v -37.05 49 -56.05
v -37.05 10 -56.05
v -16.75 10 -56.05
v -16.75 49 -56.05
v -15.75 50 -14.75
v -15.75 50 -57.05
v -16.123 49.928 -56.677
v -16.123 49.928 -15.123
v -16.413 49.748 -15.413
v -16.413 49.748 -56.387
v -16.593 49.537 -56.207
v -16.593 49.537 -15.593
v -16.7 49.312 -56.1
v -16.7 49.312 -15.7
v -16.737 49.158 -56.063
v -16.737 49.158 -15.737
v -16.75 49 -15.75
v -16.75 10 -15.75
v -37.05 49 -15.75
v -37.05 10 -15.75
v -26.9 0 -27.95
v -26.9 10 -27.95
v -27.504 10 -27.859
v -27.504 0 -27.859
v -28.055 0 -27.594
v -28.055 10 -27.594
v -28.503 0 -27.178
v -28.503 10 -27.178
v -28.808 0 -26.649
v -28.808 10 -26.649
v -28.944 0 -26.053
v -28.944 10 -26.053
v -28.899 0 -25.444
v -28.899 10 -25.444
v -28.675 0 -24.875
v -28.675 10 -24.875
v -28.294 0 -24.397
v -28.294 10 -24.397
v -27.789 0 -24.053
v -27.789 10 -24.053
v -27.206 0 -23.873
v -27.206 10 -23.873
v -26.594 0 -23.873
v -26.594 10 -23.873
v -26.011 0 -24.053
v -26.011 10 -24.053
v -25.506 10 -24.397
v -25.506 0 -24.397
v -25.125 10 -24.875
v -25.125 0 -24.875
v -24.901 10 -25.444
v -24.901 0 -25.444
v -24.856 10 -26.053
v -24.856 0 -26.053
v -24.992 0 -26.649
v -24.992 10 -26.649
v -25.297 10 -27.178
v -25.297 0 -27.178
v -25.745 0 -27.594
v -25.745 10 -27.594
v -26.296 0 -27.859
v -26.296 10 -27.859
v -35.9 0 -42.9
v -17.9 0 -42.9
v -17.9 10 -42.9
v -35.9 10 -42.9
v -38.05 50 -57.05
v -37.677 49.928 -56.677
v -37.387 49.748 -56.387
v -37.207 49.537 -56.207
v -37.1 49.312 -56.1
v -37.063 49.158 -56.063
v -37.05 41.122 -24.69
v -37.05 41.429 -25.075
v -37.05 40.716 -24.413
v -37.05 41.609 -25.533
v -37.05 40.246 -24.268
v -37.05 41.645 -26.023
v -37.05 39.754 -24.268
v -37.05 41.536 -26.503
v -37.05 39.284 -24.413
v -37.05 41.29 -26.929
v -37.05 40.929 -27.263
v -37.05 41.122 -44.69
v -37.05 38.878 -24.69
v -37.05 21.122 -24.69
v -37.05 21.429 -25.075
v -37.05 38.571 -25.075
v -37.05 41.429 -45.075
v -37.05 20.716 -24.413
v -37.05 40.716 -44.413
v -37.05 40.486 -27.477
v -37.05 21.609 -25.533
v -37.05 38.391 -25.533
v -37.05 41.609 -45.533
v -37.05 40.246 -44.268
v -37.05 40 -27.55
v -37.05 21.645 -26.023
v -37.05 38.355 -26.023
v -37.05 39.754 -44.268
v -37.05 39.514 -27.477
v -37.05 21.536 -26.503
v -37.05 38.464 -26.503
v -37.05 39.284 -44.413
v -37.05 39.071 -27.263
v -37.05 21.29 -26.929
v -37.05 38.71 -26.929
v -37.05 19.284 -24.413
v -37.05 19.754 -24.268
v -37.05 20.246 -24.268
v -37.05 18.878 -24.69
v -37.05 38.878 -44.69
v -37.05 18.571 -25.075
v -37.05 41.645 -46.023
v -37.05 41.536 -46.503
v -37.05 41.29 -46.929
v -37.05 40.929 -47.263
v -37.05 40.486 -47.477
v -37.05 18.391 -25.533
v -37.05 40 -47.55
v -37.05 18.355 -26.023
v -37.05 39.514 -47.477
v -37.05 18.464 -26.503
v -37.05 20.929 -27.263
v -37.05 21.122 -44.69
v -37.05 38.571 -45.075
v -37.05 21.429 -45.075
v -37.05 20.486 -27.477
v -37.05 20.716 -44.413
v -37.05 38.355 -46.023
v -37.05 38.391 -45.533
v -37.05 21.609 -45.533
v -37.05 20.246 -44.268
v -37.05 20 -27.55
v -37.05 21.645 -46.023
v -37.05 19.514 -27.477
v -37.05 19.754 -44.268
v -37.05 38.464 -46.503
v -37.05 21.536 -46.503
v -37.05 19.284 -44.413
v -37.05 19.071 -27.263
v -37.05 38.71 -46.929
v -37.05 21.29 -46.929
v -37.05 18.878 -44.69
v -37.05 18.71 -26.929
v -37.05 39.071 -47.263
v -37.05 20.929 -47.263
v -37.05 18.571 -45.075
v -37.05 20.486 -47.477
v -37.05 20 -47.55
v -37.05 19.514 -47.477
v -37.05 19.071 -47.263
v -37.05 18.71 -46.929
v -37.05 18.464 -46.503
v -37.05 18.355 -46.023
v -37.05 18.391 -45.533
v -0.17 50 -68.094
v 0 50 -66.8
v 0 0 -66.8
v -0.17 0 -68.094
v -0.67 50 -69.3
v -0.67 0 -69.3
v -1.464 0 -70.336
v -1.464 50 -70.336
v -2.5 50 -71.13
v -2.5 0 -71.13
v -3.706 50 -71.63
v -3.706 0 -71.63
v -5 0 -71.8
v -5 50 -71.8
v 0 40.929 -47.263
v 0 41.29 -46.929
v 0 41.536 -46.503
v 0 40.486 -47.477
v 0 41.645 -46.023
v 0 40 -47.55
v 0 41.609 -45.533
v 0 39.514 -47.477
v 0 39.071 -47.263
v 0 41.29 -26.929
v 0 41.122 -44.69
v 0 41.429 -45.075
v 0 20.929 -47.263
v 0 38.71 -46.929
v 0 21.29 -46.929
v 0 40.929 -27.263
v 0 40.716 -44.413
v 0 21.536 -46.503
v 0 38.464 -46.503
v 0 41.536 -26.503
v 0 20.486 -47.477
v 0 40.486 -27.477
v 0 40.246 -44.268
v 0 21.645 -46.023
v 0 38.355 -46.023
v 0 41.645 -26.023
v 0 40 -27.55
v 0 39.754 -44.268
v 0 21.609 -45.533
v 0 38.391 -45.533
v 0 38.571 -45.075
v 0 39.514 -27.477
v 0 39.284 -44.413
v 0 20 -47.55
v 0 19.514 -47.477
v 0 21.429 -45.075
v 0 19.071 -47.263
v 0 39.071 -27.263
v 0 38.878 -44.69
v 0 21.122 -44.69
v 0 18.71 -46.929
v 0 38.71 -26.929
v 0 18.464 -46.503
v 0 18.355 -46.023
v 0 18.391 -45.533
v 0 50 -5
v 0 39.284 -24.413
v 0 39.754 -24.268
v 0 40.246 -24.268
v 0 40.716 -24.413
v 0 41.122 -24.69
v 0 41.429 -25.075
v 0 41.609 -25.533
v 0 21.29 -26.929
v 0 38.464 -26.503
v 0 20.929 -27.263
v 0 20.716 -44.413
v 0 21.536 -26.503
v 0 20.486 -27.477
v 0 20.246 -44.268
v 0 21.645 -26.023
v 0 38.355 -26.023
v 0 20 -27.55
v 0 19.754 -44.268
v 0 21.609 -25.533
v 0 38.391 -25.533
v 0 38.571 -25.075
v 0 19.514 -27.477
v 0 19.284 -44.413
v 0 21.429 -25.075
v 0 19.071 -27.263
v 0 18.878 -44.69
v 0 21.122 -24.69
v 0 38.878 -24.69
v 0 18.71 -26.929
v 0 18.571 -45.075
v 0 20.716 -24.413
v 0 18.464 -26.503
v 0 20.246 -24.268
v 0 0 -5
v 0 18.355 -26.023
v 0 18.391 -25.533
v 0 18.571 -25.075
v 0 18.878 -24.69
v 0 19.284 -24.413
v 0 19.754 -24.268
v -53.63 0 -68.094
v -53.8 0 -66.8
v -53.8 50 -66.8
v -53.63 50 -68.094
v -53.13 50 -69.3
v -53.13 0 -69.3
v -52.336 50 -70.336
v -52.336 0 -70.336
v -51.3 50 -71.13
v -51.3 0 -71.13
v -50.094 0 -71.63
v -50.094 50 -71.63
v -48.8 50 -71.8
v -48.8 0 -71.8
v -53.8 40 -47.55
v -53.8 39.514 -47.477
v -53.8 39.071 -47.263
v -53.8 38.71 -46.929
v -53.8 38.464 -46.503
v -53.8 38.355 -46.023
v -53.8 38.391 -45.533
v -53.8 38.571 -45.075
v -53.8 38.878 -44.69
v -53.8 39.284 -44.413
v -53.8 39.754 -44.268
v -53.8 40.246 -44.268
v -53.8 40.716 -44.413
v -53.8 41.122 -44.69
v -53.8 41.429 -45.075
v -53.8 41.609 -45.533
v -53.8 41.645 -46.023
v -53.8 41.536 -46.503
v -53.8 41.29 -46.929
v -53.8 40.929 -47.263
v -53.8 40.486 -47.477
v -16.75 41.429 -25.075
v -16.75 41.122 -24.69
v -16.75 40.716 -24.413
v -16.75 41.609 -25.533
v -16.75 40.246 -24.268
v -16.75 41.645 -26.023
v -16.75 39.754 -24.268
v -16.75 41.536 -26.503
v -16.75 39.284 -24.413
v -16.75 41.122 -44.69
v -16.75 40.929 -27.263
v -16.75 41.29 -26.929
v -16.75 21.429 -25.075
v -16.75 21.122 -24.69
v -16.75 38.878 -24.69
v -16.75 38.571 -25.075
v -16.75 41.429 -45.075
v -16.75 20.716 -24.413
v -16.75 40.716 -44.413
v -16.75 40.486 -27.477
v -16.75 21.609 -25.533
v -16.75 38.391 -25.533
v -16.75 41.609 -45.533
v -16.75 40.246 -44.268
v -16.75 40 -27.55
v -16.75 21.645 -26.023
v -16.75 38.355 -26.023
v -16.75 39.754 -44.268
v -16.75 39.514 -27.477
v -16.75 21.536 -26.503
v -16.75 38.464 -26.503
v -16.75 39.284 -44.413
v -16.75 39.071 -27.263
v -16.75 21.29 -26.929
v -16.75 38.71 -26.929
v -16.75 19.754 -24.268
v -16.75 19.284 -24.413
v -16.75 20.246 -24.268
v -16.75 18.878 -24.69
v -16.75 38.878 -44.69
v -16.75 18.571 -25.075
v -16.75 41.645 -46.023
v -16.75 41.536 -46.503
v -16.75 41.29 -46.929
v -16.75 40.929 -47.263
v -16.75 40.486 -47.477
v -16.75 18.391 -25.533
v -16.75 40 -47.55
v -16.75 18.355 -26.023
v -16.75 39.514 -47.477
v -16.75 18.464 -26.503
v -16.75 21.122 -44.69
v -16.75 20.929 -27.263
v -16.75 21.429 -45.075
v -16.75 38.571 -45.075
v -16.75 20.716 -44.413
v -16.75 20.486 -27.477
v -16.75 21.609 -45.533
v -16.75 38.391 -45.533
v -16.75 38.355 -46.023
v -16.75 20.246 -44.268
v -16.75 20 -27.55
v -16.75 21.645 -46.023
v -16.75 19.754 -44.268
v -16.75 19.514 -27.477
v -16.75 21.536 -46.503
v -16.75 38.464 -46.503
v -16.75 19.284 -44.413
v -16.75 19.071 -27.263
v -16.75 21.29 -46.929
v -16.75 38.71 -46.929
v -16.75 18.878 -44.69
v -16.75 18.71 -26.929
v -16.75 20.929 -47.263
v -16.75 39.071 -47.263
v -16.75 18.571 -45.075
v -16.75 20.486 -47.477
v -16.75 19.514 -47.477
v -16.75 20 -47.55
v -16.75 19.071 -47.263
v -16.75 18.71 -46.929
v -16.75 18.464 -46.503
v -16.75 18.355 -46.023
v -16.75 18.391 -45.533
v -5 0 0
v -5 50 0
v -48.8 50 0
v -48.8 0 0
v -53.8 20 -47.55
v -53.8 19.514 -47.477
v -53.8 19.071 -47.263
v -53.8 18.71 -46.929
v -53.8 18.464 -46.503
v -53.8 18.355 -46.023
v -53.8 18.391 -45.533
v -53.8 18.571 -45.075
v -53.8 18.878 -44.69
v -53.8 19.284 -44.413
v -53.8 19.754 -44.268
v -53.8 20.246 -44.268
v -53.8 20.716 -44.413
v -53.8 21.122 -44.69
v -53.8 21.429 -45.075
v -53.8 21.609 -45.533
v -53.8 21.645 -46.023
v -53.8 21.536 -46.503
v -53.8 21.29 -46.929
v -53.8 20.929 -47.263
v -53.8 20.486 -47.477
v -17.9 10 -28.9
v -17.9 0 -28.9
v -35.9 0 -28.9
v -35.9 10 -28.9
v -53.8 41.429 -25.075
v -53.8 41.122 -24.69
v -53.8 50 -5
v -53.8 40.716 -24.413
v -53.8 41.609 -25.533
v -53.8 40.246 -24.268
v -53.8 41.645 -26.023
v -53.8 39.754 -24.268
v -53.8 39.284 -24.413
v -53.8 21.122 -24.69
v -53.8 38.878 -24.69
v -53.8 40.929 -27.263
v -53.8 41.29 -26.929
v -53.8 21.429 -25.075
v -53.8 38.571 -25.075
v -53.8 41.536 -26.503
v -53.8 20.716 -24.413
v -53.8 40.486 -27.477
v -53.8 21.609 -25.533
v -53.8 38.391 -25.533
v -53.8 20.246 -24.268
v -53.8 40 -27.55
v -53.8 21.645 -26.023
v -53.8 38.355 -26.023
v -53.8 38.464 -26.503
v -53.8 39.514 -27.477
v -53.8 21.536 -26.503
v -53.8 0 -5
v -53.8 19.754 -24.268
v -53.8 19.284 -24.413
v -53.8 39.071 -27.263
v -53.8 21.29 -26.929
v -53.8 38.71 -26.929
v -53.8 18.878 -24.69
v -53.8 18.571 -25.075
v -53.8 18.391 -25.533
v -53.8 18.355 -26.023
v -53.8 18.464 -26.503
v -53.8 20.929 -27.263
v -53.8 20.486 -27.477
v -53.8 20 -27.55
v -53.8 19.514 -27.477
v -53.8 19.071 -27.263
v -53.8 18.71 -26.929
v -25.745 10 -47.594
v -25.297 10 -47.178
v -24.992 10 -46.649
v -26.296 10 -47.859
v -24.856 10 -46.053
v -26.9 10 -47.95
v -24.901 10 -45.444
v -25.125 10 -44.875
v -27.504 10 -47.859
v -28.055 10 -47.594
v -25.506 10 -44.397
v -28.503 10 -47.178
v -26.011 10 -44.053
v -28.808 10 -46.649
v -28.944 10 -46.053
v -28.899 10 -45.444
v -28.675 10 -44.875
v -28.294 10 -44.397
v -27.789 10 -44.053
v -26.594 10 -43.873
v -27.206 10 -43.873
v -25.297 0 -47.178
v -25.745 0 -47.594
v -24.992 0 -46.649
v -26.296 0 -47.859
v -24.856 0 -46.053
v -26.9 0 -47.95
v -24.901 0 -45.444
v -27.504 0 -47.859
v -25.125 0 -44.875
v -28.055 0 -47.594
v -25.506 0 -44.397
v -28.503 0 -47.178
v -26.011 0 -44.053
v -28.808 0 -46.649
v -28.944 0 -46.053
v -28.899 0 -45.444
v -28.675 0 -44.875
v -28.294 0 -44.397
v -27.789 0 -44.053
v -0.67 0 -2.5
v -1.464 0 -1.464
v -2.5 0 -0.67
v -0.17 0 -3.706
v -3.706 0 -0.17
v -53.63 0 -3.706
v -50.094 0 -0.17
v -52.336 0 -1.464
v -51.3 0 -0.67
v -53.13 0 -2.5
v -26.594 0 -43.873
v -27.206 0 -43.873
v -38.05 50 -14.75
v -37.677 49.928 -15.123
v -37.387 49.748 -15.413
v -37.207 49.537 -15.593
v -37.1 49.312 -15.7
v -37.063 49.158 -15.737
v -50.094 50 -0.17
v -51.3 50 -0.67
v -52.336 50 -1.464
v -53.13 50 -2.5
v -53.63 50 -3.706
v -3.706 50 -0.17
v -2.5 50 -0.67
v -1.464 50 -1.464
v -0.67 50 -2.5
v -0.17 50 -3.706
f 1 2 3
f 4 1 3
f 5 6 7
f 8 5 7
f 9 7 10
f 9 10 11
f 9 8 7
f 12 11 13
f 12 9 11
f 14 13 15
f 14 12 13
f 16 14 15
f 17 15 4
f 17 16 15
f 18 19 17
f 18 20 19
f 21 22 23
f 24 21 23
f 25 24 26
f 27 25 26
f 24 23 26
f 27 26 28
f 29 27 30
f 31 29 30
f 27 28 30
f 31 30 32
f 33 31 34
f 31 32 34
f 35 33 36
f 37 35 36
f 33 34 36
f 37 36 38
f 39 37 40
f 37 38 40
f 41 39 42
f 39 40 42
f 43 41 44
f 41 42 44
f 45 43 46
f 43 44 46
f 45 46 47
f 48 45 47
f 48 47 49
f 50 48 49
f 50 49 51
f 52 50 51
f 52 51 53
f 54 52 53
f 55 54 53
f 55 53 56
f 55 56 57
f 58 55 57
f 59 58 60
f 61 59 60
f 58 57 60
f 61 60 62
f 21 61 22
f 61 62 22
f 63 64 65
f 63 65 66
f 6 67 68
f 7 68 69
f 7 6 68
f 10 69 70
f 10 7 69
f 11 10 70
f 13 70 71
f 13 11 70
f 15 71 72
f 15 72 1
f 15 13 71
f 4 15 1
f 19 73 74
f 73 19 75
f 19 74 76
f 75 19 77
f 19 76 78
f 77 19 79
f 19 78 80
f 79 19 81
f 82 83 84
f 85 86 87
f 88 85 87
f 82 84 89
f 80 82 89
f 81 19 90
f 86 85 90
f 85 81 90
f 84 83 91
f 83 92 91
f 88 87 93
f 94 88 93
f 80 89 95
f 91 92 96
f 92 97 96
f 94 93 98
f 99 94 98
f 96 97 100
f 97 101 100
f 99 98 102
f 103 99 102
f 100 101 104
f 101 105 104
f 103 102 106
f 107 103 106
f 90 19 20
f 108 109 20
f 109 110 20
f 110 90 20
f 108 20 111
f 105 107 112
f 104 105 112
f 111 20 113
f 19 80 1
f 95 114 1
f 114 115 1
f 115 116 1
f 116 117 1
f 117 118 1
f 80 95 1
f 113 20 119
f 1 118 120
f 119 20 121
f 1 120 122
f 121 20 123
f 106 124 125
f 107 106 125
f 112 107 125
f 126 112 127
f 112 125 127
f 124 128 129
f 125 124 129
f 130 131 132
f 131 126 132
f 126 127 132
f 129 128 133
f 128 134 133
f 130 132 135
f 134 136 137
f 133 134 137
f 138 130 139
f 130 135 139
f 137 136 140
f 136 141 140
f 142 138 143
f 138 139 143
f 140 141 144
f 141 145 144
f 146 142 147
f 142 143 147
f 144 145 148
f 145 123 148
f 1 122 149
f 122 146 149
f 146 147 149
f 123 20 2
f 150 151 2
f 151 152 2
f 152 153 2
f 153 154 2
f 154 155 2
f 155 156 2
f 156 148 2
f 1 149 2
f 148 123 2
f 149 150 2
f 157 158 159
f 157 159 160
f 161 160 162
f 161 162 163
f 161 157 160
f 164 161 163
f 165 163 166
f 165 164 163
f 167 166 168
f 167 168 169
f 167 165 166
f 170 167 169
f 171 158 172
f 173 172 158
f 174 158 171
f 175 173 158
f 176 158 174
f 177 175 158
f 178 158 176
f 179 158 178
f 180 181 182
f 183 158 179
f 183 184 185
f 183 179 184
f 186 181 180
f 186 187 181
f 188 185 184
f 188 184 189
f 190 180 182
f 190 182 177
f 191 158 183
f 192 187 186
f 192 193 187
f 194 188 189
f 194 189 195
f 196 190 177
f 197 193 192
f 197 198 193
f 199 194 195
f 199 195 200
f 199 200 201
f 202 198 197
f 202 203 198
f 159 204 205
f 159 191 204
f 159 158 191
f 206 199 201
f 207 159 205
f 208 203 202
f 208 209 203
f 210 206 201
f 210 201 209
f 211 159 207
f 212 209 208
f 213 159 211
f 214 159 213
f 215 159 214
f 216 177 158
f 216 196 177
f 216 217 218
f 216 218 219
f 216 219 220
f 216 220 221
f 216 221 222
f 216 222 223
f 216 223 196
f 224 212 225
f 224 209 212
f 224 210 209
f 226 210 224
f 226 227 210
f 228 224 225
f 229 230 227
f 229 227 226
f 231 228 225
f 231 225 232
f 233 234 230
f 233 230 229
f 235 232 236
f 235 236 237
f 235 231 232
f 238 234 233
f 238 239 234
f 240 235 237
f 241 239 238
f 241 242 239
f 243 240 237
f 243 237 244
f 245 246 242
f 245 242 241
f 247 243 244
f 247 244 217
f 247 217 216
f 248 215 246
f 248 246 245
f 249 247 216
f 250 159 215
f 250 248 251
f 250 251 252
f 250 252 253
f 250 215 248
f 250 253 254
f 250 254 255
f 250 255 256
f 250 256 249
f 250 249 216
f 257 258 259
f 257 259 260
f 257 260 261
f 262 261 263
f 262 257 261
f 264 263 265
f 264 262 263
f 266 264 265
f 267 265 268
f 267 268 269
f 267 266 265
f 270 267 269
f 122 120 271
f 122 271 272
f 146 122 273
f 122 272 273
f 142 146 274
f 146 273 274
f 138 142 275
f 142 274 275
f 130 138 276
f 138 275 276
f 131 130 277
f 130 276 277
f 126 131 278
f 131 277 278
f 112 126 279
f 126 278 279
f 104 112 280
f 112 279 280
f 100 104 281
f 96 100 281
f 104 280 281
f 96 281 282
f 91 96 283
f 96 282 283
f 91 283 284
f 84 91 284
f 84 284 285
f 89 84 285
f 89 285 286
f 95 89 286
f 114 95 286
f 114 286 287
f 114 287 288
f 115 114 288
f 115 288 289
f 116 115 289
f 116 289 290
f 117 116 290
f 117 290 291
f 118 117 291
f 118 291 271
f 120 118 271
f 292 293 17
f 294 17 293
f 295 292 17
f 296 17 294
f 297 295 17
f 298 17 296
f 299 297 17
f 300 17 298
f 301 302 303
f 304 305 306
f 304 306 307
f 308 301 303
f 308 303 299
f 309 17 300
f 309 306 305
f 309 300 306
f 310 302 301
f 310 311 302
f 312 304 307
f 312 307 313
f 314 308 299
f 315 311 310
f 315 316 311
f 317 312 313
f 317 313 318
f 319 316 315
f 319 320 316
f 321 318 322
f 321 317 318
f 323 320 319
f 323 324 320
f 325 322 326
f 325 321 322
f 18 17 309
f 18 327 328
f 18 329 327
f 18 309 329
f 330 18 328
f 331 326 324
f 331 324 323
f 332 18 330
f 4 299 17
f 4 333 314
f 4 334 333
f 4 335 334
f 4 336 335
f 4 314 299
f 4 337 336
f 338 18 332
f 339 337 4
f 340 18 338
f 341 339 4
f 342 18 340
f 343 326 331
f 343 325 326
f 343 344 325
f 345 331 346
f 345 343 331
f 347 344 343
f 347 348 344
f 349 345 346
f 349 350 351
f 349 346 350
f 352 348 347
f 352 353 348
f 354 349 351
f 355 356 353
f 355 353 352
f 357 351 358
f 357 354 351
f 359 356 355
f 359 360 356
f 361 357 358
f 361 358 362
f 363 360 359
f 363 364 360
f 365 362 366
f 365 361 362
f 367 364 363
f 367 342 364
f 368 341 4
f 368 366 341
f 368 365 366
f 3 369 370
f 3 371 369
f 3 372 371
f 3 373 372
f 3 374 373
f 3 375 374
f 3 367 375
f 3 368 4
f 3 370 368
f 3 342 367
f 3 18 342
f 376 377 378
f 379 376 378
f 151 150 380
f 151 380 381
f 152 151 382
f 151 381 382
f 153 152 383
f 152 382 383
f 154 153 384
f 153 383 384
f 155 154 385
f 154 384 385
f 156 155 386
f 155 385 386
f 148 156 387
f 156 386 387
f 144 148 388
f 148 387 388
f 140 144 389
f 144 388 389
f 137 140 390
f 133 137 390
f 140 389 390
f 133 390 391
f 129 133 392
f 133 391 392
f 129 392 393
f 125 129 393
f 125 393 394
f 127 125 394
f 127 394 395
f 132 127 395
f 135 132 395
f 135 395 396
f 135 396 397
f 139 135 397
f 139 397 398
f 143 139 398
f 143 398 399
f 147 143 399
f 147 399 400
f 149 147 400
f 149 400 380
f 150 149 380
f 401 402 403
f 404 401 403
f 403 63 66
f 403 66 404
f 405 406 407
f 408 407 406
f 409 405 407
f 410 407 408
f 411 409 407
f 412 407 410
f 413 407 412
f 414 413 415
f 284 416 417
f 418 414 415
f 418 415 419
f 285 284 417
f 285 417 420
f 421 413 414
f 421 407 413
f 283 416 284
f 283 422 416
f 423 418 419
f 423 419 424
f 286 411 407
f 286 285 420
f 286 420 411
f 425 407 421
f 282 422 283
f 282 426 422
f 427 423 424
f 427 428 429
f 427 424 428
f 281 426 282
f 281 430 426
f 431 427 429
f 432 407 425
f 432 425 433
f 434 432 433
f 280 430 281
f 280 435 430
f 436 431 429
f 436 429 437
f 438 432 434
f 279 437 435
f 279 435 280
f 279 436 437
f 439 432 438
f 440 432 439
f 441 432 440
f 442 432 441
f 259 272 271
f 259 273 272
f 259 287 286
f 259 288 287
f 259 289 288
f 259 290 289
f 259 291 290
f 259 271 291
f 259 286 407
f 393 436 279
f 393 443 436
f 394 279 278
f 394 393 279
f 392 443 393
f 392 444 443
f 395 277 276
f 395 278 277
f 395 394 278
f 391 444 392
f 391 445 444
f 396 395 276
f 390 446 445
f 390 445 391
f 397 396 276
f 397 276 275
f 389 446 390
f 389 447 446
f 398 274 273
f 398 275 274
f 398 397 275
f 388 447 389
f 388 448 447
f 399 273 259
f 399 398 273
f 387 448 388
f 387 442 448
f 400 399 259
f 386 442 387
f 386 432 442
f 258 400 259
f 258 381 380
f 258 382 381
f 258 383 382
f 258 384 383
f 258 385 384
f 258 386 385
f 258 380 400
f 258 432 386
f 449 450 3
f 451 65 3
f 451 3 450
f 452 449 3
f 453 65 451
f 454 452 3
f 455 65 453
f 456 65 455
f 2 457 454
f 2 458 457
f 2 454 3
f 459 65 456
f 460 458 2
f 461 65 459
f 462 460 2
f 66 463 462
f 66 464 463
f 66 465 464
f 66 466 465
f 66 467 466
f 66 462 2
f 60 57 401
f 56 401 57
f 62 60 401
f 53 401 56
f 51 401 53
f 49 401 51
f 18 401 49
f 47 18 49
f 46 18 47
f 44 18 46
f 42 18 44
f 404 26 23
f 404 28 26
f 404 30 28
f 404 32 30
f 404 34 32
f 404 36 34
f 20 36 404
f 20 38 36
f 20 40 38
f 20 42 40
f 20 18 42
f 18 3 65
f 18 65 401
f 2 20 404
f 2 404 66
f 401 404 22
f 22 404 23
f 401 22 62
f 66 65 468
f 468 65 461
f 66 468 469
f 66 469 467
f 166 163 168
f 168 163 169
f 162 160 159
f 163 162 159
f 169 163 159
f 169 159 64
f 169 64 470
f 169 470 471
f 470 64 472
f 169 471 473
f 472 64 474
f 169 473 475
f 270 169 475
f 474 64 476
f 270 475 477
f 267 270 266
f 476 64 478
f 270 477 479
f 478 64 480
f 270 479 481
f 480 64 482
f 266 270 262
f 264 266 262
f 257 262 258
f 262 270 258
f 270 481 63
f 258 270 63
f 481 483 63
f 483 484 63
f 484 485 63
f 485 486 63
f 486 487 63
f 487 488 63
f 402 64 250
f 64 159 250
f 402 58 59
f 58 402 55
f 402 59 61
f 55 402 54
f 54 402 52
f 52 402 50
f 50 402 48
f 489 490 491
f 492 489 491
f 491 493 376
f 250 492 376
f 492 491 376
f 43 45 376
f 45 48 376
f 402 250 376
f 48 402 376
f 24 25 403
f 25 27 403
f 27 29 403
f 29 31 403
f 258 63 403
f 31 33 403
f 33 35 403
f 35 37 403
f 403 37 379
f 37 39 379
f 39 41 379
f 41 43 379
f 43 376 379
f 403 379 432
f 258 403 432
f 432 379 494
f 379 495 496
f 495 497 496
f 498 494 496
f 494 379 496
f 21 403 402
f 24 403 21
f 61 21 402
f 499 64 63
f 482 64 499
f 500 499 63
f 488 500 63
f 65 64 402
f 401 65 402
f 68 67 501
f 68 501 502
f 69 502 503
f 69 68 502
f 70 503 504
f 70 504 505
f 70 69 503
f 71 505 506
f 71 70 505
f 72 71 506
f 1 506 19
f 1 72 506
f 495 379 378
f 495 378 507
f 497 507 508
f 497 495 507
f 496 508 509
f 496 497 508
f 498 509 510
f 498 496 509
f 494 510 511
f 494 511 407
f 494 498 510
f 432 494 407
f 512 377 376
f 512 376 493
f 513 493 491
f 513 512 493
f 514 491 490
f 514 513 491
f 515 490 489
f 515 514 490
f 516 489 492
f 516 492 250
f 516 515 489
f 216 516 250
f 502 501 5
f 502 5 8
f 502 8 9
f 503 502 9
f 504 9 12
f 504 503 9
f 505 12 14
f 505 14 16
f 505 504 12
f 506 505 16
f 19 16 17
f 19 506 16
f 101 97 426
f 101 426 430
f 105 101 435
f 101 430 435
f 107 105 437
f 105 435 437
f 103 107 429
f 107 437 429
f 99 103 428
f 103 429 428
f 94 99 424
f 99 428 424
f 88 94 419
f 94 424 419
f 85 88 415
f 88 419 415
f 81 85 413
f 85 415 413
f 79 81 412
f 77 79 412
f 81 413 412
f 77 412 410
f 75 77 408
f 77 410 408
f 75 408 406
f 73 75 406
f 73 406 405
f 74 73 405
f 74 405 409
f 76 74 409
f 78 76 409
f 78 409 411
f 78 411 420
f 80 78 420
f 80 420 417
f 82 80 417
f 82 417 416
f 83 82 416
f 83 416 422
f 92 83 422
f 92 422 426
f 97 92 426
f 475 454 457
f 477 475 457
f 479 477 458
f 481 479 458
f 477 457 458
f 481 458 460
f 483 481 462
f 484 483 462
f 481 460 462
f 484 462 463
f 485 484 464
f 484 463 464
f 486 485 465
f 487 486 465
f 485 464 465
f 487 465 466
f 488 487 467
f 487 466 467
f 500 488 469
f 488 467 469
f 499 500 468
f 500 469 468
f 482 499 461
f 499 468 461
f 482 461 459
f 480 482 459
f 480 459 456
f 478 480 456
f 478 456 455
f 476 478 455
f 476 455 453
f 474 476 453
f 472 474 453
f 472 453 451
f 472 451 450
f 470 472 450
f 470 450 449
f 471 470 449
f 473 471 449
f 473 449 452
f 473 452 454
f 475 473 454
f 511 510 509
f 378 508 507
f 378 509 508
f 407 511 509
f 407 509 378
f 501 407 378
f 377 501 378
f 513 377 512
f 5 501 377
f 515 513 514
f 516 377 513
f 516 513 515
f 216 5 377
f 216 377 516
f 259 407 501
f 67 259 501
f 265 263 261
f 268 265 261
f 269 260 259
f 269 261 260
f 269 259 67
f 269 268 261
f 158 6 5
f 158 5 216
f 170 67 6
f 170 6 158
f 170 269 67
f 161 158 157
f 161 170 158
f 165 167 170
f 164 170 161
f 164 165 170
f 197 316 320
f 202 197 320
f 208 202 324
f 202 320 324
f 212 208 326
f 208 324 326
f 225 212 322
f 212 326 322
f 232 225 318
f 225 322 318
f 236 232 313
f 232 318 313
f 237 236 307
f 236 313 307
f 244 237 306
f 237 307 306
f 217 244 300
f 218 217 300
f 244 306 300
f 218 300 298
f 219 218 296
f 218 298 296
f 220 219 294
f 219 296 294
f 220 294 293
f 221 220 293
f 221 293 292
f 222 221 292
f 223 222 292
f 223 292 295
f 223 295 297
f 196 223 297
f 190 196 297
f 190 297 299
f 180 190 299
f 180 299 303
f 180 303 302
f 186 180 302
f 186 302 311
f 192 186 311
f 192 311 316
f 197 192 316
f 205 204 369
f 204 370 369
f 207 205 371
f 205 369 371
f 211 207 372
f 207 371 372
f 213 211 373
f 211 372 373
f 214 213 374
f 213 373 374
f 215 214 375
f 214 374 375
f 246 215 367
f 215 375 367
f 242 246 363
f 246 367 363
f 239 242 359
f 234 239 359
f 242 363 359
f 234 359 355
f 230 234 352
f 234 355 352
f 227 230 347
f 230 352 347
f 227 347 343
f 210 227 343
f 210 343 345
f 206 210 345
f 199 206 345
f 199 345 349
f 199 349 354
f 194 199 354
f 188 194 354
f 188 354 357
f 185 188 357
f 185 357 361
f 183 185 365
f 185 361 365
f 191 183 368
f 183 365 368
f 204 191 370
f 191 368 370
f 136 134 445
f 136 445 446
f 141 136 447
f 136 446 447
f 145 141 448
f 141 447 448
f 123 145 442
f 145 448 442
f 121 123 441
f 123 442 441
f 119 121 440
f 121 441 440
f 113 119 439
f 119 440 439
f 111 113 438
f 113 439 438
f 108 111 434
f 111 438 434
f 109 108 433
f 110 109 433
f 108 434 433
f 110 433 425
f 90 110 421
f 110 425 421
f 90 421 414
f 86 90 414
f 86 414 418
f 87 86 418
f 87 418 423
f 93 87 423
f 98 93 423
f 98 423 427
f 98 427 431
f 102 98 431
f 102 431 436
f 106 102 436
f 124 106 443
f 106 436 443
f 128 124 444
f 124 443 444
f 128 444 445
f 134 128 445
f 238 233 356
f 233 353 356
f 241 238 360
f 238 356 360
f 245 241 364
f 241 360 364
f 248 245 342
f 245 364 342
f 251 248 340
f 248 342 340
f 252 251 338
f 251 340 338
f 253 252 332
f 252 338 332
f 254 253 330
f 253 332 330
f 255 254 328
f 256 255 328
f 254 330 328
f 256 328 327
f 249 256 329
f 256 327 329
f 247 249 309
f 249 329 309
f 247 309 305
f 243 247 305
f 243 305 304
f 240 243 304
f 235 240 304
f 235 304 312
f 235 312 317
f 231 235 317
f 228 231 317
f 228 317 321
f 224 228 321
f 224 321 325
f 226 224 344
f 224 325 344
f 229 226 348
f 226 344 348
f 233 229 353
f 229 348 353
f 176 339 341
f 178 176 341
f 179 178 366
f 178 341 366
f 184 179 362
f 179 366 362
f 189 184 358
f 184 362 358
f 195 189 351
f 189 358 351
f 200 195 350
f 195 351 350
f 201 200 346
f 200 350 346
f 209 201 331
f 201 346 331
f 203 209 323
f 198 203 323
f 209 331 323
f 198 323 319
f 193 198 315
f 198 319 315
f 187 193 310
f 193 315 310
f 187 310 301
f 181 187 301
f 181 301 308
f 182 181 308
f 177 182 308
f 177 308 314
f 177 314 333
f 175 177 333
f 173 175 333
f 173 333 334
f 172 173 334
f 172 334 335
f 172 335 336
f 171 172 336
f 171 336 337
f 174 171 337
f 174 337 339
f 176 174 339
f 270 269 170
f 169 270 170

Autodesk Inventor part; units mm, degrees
ref_plane "YZ Plane" through (0, 0, 0) normal (1, 0, 0) x (0, 1, 0)
ref_plane "XZ Plane" through (0, 0, 0) normal (0, 1, 0) x (-1, 0, 0)
ref_plane "XY Plane" through (0, 0, 0) normal (0, 0, 1) x (1, 0, 0)
sketch "スケッチ1" plane through (0, 0, 0) normal (0, 1, 0) x (-1, 0, 0)
  line L0 (0, 0) -> (53.8, 0)
  line L1 (53.8, 0) -> (53.8, -71.8)
  line L2 (53.8, -71.8) -> (0, -71.8)
  line L3 (0, -71.8) -> (0, 0)
  dimension "d0" = 53.8
  dimension "d1" = 71.8
extrude "押し出し1" add sketch "スケッチ1" along normal blind 10
sketch "スケッチ2" plane through (0, 10, 0) normal (0, 1, 0) x (1, 0, 0)
  line L0 (-53.8, 71.8) -> (-53.8, 0) projected
  line L1 (-53.8, 0) -> (0, 0) projected
  line L2 (-26.9, 0) -> (-26.9, 71.8)
  line L3 (0, 71.8) -> (-53.8, 71.8) projected
  line L4 (-53.8, 35.9) -> (0, 35.9)
  line L5 (0, 0) -> (0, 71.8) projected
  line L6 (-26.9, 35.9) -> (-37.05, 35.9)
  line L7 (-37.05, 35.9) -> (-37.05, 56.05)
  line L8 (-37.05, 56.05) -> (-26.9, 56.05)
  line L9 (-26.9, 56.05) -> (-26.9, 35.9)
  line L10 (-37.05, 35.9) -> (-37.05, 15.75)
  line L11 (-37.05, 15.75) -> (-26.9, 15.75)
  line L12 (-16.75, 35.9) -> (-16.75, 56.05)
  line L13 (-16.75, 56.05) -> (-26.9, 56.05)
  line L14 (-16.75, 35.9) -> (-16.75, 15.75)
  line L15 (-16.75, 15.75) -> (-26.9, 15.75)
  dimension "d7" = 20.15
  dimension "d8" = 10.15
extrude "押し出し2" add sketch "スケッチ2" along normal blind 40 contours L3 L2 L8 L7 L4 L0 | L4 L10 L11 L2 L1 L0 | L3 L5 L4 L12 L13 L2 | L2 L15 L14 L4 L5 L1
fillet "フィレット1" radius 5 4 edges at (0, 25, 0) (0, 25, -71.8) (-53.8, 25, -71.8) (-53.8, 25, 0)
sketch "スケッチ3" plane through (0, 0, -5) normal (1, 0, 0) x (0, 0, -1)
  line L0 (51.05, 50) -> (10.75, 50) projected
  line L1 (30.9, 50) -> (30.9, 0)
  line L2 (0, 0) -> (61.8, 0) projected
  line L3 (20.9, 50) -> (20.9, 0)
  line L4 (0, 50) -> (0, 0) projected
  line L5 (0, 10) -> (62, 10)
  line L6 (10.75, 10) -> (51.05, 10) projected
  point P0 (-5, 0)
  point P1 (20.9, 20)
  point P2 (20.9, 40)
  point P3 (40.9, 20)
  point P4 (40.9, 40)
  dimension "d12" = 10
  dimension "d13" = 10
  dimension "d14" = 10
  dimension "d15" = 20
hole "穴1" at (0, 20, -25.9) at (0, 40, -25.9) at (0, 40, -45.9) at (0, 20, -45.9) direction (-1, 0, 0) diameter 3.3 end through all
sketch "スケッチ4" plane through (0, 0, 0) normal (0, -1, 0) x (1, 0, 0)
  line L0 (-5, -71.8) -> (-48.8, -71.8) projected
  line L1 (-26.9, -71.8) -> (-26.9, 0)
  line L2 (-48.8, 0) -> (-5, 0) projected
  line L3 (-53.8, -66.8) -> (-53.8, -5) projected
  line L4 (-53.8, -35.9) -> (0, -35.9)
  line L5 (0, -5) -> (0, -66.8) projected
  point P0 (0, 0)
  point P1 (-26.9, -45.9)
  point P2 (-26.9, -25.9)
  dimension "d23" = 10
  dimension "d24" = 10
hole "穴2" at (-26.9, 0, -45.9) at (-26.9, 0, -25.9) direction (0, 1, 0) diameter 4.1 end through all
fillet "フィレット2" radius 1 4 edges at (-37.05, 50, -35.9) (-26.9, 50, -15.75) (-16.75, 50, -35.9) (-26.9, 50, -56.05)
sketch "スケッチ5" plane through (0, 0, 0) normal (0, -1, 0) x (1, 0, 0)
  circle A0 centre (-26.9, -25.9) radius 2.05 projected
  circle A1 centre (-26.9, -45.9) radius 2.05 projected
  line L0 (-26.9, -25.9) -> (-26.9, -45.9)
  line L1 (-26.9, -35.9) -> (-17.9, -35.9)
  line L2 (-17.9, -35.9) -> (-17.9, -42.9)
  line L3 (-17.9, -42.9) -> (-26.9, -42.9)
  line L4 (-26.9, -42.9) -> (-26.9, -35.9)
  line L5 (-17.9, -35.9) -> (-17.9, -28.9)
  line L6 (-17.9, -28.9) -> (-26.9, -28.9)
  line L7 (-35.9, -35.9) -> (-35.9, -42.9)
  line L8 (-35.9, -42.9) -> (-26.9, -42.9)
  line L9 (-35.9, -35.9) -> (-35.9, -28.9)
  line L10 (-35.9, -28.9) -> (-26.9, -28.9)
  point P0 (0, 0)
  dimension "d33" = 7
  dimension "d34" = 9
extrude "押し出し3" cut sketch "スケッチ5" against normal blind 10 contours L6 L5 L1 L0 | L0 L8 L7 L9 L10 | L1 L2 L3 L0
properties part number "framefixpart1"
